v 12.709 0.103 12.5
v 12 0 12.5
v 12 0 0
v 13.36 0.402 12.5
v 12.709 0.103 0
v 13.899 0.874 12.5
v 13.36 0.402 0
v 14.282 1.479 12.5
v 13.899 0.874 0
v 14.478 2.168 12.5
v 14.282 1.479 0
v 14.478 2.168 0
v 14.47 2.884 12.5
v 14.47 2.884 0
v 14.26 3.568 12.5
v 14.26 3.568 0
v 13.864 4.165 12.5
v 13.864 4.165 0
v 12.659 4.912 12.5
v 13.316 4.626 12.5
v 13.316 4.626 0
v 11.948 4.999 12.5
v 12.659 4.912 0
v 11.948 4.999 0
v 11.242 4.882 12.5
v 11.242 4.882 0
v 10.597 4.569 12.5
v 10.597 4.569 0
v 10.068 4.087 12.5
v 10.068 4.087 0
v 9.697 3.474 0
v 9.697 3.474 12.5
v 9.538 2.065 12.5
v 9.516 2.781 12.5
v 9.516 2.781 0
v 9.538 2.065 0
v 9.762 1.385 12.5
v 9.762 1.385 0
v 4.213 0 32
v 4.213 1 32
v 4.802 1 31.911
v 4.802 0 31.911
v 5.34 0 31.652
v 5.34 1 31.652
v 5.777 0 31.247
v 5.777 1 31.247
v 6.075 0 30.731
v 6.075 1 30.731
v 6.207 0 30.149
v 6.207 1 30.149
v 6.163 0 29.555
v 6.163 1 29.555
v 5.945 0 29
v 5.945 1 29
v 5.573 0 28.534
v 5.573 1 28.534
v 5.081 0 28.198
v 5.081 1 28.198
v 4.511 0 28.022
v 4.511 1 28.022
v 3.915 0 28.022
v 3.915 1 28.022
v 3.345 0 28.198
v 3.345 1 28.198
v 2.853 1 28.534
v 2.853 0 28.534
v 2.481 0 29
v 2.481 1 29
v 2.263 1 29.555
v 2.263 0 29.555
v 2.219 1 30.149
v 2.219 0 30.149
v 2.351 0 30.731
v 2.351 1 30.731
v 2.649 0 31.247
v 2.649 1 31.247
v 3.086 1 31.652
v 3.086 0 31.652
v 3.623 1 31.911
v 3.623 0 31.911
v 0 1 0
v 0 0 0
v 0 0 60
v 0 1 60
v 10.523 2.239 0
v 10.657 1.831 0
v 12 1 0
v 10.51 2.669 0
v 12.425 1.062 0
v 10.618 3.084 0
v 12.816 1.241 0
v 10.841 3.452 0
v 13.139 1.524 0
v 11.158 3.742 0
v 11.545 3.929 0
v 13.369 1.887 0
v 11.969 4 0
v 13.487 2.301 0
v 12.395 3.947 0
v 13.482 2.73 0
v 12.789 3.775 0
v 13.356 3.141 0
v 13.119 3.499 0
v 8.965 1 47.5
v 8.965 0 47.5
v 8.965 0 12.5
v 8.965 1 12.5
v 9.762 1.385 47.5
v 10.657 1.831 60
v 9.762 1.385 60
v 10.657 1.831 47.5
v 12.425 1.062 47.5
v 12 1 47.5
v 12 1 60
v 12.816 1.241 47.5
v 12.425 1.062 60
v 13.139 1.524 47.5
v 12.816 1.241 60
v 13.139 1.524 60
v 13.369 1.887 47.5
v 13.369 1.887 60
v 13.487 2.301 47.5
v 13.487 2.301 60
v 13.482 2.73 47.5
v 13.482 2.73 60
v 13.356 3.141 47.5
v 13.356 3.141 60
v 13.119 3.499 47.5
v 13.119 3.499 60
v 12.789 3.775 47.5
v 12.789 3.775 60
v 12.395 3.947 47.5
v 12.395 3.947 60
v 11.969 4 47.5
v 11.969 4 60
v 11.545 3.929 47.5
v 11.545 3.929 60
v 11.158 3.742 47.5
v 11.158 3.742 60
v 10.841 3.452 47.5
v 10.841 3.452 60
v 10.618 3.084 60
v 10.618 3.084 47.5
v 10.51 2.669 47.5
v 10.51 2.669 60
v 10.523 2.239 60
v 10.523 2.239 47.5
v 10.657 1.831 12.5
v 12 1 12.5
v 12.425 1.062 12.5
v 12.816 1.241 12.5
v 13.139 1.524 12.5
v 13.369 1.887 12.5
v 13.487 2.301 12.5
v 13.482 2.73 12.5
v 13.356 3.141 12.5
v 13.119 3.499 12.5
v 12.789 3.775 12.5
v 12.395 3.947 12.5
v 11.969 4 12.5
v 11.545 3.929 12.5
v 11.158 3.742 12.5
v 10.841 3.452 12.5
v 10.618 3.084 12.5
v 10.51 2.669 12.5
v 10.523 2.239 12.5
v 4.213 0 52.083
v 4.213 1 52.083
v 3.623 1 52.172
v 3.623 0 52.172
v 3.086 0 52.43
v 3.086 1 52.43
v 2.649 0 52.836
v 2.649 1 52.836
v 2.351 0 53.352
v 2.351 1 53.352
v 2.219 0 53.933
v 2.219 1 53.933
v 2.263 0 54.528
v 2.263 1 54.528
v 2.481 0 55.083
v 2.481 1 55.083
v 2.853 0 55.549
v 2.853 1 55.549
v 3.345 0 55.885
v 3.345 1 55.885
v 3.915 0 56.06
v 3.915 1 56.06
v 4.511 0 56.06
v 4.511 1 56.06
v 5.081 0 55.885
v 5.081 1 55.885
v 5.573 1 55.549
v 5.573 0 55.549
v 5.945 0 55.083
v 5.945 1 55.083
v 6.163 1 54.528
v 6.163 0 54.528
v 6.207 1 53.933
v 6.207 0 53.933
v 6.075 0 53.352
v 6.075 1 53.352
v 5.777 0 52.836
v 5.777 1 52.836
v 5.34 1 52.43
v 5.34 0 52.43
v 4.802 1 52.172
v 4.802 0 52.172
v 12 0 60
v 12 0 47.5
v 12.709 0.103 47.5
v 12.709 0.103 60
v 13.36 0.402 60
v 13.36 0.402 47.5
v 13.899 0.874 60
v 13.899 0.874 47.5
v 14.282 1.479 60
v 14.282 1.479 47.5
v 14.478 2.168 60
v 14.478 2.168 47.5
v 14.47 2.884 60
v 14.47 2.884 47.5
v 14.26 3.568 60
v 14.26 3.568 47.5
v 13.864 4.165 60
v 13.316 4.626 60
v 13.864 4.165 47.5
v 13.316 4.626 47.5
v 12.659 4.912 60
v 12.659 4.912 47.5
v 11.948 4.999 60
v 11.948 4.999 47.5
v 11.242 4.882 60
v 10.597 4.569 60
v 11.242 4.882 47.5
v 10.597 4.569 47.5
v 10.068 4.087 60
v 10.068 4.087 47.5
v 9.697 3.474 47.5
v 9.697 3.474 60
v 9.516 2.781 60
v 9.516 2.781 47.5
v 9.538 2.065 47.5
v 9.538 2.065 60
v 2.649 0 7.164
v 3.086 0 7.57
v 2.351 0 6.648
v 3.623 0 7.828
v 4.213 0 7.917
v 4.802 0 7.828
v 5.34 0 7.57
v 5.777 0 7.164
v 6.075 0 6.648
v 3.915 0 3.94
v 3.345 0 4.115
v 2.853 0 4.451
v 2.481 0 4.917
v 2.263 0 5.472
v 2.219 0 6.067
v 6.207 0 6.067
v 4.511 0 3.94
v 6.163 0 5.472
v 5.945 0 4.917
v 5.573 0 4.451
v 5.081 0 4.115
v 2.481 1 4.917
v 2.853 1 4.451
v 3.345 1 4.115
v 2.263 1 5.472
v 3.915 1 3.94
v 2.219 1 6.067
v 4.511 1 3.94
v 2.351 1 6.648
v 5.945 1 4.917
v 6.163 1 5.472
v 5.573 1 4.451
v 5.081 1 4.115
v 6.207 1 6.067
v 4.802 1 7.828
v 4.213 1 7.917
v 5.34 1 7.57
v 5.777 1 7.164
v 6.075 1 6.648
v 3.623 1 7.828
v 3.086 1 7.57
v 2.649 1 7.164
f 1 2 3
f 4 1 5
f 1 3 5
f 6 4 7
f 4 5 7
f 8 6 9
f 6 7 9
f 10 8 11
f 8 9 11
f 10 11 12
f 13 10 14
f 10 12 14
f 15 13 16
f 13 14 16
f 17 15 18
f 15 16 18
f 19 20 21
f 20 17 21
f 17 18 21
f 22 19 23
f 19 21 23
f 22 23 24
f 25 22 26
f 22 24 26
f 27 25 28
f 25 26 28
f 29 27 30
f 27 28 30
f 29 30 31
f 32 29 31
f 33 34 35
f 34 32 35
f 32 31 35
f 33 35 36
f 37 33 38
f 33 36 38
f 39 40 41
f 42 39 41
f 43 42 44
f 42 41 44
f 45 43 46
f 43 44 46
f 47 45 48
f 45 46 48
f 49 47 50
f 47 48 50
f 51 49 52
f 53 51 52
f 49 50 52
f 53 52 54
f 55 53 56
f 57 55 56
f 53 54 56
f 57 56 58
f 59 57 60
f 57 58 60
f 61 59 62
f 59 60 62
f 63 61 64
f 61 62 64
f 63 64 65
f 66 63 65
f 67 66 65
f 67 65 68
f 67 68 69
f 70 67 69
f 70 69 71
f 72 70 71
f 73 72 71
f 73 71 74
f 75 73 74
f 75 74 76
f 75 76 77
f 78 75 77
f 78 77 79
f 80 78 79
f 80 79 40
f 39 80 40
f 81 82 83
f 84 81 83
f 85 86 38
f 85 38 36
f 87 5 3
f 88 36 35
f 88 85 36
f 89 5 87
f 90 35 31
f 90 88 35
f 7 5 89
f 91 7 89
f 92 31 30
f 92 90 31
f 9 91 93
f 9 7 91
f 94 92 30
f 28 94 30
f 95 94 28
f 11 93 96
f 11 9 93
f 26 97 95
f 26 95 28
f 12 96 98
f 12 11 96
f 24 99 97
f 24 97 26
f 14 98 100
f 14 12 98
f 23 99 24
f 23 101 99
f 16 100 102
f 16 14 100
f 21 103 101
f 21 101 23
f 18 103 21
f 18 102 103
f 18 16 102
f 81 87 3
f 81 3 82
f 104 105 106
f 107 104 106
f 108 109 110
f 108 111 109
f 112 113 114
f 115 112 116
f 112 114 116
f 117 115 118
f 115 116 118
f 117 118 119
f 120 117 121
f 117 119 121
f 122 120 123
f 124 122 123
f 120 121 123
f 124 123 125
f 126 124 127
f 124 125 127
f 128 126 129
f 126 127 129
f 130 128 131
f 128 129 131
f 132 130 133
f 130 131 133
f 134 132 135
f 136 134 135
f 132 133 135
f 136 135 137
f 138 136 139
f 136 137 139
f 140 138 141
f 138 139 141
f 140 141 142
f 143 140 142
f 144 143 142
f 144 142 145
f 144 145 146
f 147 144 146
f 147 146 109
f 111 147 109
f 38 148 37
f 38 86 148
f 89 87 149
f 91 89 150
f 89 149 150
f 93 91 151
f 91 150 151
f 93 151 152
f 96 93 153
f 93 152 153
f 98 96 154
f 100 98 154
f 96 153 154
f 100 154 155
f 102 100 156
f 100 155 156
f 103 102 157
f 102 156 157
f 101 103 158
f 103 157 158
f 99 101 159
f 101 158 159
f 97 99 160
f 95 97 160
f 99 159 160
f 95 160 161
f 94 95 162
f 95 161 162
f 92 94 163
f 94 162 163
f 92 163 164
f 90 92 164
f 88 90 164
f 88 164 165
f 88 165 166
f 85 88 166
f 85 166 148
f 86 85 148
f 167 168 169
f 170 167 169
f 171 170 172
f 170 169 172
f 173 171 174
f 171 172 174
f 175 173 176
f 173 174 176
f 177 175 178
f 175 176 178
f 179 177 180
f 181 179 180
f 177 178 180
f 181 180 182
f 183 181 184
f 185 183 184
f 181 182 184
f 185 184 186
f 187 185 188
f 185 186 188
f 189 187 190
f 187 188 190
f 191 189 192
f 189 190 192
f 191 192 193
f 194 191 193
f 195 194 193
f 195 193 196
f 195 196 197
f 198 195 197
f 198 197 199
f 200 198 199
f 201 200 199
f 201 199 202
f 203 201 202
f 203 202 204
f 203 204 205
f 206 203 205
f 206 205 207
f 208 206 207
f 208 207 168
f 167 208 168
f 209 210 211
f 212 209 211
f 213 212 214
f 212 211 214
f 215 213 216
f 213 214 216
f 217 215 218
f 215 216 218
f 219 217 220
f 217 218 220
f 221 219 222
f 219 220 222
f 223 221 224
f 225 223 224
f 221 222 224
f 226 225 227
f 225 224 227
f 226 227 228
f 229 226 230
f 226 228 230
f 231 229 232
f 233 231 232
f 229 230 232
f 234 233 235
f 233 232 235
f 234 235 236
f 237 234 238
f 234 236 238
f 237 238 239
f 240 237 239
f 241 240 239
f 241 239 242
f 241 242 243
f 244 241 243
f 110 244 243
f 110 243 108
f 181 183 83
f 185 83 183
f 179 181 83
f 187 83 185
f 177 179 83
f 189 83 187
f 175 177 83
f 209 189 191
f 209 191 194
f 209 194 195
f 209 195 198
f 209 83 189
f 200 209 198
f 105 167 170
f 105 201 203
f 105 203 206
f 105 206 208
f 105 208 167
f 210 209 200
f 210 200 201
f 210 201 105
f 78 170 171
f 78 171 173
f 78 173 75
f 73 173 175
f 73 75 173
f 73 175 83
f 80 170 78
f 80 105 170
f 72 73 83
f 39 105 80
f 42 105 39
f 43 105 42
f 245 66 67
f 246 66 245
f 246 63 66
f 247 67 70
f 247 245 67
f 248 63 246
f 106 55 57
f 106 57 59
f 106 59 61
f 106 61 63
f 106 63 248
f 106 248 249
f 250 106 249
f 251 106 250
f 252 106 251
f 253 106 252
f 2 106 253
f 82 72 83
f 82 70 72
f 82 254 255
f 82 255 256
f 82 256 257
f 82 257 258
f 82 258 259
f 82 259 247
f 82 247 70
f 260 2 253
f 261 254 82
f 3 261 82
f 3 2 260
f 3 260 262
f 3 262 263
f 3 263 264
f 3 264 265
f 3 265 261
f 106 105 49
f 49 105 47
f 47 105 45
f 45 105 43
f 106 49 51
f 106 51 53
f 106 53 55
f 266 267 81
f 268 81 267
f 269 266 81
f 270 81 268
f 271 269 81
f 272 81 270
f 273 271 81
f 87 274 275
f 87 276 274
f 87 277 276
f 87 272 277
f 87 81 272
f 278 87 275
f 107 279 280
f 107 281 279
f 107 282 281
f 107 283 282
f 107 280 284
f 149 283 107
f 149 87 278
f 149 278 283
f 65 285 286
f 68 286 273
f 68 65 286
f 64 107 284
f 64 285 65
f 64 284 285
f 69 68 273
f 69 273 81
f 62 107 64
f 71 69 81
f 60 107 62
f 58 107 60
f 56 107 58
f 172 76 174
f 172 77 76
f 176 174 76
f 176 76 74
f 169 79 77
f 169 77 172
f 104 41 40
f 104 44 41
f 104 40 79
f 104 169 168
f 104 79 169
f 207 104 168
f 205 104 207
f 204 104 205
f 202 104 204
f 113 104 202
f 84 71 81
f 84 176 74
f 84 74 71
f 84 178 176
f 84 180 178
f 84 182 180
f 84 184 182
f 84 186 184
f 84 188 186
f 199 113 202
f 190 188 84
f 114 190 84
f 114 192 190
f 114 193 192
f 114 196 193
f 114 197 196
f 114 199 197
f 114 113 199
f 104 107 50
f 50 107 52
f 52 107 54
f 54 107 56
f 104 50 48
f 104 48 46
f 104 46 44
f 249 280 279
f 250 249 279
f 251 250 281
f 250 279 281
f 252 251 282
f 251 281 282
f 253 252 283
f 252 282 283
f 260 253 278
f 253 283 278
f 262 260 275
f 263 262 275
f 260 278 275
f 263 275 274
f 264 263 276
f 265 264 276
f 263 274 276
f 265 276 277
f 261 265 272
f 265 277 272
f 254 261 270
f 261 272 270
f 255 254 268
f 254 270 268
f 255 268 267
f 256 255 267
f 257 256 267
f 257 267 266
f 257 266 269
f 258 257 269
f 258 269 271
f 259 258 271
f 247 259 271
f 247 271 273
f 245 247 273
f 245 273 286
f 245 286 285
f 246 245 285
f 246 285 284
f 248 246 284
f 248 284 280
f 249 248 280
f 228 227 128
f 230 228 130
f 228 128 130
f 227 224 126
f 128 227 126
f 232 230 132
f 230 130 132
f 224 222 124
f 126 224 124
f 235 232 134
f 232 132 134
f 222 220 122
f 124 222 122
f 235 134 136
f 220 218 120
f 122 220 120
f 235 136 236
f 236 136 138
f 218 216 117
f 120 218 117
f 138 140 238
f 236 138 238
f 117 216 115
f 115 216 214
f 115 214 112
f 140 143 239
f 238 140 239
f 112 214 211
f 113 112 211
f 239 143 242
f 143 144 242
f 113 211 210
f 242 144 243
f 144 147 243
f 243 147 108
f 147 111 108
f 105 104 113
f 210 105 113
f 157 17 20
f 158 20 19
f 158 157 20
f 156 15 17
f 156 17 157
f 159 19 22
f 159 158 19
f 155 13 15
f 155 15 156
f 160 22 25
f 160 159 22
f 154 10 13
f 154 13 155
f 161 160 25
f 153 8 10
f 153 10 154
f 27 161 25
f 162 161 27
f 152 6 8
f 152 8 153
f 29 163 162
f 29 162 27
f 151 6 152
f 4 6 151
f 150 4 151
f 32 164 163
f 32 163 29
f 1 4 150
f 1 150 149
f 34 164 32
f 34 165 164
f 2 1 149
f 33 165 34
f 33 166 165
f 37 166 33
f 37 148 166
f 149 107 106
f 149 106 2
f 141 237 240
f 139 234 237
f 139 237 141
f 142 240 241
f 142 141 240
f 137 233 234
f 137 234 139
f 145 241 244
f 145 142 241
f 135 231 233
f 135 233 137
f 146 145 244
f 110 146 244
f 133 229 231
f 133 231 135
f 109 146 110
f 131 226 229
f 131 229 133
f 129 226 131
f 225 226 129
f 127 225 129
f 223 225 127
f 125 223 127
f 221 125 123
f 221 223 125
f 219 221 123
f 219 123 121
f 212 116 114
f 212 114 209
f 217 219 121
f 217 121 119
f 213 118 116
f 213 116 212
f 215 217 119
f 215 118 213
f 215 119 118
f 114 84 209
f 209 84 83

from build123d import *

# Parameters (mm, degrees)
SKETCH3_W          = 60
SKETCH3_H          = 1
SKETCH4_W          = 6.07081849
SKETCH4_H          = 35
CUT_EXTRUDE1_DEPTH = 62.929395282
SKETCH5_R          = 2
CUT_EXTRUDE2_DEPTH = 62.85668921


with BuildPart() as part:
    # Sweep1: sweep along a path in Sketch1
    with BuildLine(Plane.XY) as sweep1_path:
        Line((0, 0), (12, 0))
        ThreePointArc((12, 0), (13.315747679, 4.62574882), (9.762440739, 1.384953564))
    # Sketch3 → Sweep1 (sweep)
    with BuildSketch(Plane(origin=(0, 0, 0), x_dir=(0, 0, -1), z_dir=(1, 0, 0))):
        with Locations((-30, 0.5)):
            Rectangle(SKETCH3_W, SKETCH3_H)
    sweep(path=sweep1_path.line)

    # Sketch4 → Cut-Extrude1 (cut, through all)
    with BuildSketch(Plane(origin=(0, 0, 0), x_dir=(-1, 0, 0), z_dir=(0, -1, 0))):
        with Locations((-12, -30)):
            Rectangle(SKETCH4_W, SKETCH4_H)
    extrude(amount=-CUT_EXTRUDE1_DEPTH, mode=Mode.SUBTRACT)

    # Sketch5 → Cut-Extrude2 (cut, through all)
    with BuildSketch(Plane(origin=(0, 1, 0), x_dir=(1, 0, 0), z_dir=(0, 1, 0))):
        with Locations(Location((4.212926144, -5.917287591, 0), (0, 0, 270))):
            Circle(SKETCH5_R)
        with Locations(Location((4.212926144, -54.082712409, 0), (0, 0, 90))):
            Circle(SKETCH5_R)
        with Locations(Location((4.212926144, -30, 0), (0, 0, 270))):
            Circle(SKETCH5_R)
    extrude(amount=-CUT_EXTRUDE2_DEPTH, mode=Mode.SUBTRACT)


solid = part.part
